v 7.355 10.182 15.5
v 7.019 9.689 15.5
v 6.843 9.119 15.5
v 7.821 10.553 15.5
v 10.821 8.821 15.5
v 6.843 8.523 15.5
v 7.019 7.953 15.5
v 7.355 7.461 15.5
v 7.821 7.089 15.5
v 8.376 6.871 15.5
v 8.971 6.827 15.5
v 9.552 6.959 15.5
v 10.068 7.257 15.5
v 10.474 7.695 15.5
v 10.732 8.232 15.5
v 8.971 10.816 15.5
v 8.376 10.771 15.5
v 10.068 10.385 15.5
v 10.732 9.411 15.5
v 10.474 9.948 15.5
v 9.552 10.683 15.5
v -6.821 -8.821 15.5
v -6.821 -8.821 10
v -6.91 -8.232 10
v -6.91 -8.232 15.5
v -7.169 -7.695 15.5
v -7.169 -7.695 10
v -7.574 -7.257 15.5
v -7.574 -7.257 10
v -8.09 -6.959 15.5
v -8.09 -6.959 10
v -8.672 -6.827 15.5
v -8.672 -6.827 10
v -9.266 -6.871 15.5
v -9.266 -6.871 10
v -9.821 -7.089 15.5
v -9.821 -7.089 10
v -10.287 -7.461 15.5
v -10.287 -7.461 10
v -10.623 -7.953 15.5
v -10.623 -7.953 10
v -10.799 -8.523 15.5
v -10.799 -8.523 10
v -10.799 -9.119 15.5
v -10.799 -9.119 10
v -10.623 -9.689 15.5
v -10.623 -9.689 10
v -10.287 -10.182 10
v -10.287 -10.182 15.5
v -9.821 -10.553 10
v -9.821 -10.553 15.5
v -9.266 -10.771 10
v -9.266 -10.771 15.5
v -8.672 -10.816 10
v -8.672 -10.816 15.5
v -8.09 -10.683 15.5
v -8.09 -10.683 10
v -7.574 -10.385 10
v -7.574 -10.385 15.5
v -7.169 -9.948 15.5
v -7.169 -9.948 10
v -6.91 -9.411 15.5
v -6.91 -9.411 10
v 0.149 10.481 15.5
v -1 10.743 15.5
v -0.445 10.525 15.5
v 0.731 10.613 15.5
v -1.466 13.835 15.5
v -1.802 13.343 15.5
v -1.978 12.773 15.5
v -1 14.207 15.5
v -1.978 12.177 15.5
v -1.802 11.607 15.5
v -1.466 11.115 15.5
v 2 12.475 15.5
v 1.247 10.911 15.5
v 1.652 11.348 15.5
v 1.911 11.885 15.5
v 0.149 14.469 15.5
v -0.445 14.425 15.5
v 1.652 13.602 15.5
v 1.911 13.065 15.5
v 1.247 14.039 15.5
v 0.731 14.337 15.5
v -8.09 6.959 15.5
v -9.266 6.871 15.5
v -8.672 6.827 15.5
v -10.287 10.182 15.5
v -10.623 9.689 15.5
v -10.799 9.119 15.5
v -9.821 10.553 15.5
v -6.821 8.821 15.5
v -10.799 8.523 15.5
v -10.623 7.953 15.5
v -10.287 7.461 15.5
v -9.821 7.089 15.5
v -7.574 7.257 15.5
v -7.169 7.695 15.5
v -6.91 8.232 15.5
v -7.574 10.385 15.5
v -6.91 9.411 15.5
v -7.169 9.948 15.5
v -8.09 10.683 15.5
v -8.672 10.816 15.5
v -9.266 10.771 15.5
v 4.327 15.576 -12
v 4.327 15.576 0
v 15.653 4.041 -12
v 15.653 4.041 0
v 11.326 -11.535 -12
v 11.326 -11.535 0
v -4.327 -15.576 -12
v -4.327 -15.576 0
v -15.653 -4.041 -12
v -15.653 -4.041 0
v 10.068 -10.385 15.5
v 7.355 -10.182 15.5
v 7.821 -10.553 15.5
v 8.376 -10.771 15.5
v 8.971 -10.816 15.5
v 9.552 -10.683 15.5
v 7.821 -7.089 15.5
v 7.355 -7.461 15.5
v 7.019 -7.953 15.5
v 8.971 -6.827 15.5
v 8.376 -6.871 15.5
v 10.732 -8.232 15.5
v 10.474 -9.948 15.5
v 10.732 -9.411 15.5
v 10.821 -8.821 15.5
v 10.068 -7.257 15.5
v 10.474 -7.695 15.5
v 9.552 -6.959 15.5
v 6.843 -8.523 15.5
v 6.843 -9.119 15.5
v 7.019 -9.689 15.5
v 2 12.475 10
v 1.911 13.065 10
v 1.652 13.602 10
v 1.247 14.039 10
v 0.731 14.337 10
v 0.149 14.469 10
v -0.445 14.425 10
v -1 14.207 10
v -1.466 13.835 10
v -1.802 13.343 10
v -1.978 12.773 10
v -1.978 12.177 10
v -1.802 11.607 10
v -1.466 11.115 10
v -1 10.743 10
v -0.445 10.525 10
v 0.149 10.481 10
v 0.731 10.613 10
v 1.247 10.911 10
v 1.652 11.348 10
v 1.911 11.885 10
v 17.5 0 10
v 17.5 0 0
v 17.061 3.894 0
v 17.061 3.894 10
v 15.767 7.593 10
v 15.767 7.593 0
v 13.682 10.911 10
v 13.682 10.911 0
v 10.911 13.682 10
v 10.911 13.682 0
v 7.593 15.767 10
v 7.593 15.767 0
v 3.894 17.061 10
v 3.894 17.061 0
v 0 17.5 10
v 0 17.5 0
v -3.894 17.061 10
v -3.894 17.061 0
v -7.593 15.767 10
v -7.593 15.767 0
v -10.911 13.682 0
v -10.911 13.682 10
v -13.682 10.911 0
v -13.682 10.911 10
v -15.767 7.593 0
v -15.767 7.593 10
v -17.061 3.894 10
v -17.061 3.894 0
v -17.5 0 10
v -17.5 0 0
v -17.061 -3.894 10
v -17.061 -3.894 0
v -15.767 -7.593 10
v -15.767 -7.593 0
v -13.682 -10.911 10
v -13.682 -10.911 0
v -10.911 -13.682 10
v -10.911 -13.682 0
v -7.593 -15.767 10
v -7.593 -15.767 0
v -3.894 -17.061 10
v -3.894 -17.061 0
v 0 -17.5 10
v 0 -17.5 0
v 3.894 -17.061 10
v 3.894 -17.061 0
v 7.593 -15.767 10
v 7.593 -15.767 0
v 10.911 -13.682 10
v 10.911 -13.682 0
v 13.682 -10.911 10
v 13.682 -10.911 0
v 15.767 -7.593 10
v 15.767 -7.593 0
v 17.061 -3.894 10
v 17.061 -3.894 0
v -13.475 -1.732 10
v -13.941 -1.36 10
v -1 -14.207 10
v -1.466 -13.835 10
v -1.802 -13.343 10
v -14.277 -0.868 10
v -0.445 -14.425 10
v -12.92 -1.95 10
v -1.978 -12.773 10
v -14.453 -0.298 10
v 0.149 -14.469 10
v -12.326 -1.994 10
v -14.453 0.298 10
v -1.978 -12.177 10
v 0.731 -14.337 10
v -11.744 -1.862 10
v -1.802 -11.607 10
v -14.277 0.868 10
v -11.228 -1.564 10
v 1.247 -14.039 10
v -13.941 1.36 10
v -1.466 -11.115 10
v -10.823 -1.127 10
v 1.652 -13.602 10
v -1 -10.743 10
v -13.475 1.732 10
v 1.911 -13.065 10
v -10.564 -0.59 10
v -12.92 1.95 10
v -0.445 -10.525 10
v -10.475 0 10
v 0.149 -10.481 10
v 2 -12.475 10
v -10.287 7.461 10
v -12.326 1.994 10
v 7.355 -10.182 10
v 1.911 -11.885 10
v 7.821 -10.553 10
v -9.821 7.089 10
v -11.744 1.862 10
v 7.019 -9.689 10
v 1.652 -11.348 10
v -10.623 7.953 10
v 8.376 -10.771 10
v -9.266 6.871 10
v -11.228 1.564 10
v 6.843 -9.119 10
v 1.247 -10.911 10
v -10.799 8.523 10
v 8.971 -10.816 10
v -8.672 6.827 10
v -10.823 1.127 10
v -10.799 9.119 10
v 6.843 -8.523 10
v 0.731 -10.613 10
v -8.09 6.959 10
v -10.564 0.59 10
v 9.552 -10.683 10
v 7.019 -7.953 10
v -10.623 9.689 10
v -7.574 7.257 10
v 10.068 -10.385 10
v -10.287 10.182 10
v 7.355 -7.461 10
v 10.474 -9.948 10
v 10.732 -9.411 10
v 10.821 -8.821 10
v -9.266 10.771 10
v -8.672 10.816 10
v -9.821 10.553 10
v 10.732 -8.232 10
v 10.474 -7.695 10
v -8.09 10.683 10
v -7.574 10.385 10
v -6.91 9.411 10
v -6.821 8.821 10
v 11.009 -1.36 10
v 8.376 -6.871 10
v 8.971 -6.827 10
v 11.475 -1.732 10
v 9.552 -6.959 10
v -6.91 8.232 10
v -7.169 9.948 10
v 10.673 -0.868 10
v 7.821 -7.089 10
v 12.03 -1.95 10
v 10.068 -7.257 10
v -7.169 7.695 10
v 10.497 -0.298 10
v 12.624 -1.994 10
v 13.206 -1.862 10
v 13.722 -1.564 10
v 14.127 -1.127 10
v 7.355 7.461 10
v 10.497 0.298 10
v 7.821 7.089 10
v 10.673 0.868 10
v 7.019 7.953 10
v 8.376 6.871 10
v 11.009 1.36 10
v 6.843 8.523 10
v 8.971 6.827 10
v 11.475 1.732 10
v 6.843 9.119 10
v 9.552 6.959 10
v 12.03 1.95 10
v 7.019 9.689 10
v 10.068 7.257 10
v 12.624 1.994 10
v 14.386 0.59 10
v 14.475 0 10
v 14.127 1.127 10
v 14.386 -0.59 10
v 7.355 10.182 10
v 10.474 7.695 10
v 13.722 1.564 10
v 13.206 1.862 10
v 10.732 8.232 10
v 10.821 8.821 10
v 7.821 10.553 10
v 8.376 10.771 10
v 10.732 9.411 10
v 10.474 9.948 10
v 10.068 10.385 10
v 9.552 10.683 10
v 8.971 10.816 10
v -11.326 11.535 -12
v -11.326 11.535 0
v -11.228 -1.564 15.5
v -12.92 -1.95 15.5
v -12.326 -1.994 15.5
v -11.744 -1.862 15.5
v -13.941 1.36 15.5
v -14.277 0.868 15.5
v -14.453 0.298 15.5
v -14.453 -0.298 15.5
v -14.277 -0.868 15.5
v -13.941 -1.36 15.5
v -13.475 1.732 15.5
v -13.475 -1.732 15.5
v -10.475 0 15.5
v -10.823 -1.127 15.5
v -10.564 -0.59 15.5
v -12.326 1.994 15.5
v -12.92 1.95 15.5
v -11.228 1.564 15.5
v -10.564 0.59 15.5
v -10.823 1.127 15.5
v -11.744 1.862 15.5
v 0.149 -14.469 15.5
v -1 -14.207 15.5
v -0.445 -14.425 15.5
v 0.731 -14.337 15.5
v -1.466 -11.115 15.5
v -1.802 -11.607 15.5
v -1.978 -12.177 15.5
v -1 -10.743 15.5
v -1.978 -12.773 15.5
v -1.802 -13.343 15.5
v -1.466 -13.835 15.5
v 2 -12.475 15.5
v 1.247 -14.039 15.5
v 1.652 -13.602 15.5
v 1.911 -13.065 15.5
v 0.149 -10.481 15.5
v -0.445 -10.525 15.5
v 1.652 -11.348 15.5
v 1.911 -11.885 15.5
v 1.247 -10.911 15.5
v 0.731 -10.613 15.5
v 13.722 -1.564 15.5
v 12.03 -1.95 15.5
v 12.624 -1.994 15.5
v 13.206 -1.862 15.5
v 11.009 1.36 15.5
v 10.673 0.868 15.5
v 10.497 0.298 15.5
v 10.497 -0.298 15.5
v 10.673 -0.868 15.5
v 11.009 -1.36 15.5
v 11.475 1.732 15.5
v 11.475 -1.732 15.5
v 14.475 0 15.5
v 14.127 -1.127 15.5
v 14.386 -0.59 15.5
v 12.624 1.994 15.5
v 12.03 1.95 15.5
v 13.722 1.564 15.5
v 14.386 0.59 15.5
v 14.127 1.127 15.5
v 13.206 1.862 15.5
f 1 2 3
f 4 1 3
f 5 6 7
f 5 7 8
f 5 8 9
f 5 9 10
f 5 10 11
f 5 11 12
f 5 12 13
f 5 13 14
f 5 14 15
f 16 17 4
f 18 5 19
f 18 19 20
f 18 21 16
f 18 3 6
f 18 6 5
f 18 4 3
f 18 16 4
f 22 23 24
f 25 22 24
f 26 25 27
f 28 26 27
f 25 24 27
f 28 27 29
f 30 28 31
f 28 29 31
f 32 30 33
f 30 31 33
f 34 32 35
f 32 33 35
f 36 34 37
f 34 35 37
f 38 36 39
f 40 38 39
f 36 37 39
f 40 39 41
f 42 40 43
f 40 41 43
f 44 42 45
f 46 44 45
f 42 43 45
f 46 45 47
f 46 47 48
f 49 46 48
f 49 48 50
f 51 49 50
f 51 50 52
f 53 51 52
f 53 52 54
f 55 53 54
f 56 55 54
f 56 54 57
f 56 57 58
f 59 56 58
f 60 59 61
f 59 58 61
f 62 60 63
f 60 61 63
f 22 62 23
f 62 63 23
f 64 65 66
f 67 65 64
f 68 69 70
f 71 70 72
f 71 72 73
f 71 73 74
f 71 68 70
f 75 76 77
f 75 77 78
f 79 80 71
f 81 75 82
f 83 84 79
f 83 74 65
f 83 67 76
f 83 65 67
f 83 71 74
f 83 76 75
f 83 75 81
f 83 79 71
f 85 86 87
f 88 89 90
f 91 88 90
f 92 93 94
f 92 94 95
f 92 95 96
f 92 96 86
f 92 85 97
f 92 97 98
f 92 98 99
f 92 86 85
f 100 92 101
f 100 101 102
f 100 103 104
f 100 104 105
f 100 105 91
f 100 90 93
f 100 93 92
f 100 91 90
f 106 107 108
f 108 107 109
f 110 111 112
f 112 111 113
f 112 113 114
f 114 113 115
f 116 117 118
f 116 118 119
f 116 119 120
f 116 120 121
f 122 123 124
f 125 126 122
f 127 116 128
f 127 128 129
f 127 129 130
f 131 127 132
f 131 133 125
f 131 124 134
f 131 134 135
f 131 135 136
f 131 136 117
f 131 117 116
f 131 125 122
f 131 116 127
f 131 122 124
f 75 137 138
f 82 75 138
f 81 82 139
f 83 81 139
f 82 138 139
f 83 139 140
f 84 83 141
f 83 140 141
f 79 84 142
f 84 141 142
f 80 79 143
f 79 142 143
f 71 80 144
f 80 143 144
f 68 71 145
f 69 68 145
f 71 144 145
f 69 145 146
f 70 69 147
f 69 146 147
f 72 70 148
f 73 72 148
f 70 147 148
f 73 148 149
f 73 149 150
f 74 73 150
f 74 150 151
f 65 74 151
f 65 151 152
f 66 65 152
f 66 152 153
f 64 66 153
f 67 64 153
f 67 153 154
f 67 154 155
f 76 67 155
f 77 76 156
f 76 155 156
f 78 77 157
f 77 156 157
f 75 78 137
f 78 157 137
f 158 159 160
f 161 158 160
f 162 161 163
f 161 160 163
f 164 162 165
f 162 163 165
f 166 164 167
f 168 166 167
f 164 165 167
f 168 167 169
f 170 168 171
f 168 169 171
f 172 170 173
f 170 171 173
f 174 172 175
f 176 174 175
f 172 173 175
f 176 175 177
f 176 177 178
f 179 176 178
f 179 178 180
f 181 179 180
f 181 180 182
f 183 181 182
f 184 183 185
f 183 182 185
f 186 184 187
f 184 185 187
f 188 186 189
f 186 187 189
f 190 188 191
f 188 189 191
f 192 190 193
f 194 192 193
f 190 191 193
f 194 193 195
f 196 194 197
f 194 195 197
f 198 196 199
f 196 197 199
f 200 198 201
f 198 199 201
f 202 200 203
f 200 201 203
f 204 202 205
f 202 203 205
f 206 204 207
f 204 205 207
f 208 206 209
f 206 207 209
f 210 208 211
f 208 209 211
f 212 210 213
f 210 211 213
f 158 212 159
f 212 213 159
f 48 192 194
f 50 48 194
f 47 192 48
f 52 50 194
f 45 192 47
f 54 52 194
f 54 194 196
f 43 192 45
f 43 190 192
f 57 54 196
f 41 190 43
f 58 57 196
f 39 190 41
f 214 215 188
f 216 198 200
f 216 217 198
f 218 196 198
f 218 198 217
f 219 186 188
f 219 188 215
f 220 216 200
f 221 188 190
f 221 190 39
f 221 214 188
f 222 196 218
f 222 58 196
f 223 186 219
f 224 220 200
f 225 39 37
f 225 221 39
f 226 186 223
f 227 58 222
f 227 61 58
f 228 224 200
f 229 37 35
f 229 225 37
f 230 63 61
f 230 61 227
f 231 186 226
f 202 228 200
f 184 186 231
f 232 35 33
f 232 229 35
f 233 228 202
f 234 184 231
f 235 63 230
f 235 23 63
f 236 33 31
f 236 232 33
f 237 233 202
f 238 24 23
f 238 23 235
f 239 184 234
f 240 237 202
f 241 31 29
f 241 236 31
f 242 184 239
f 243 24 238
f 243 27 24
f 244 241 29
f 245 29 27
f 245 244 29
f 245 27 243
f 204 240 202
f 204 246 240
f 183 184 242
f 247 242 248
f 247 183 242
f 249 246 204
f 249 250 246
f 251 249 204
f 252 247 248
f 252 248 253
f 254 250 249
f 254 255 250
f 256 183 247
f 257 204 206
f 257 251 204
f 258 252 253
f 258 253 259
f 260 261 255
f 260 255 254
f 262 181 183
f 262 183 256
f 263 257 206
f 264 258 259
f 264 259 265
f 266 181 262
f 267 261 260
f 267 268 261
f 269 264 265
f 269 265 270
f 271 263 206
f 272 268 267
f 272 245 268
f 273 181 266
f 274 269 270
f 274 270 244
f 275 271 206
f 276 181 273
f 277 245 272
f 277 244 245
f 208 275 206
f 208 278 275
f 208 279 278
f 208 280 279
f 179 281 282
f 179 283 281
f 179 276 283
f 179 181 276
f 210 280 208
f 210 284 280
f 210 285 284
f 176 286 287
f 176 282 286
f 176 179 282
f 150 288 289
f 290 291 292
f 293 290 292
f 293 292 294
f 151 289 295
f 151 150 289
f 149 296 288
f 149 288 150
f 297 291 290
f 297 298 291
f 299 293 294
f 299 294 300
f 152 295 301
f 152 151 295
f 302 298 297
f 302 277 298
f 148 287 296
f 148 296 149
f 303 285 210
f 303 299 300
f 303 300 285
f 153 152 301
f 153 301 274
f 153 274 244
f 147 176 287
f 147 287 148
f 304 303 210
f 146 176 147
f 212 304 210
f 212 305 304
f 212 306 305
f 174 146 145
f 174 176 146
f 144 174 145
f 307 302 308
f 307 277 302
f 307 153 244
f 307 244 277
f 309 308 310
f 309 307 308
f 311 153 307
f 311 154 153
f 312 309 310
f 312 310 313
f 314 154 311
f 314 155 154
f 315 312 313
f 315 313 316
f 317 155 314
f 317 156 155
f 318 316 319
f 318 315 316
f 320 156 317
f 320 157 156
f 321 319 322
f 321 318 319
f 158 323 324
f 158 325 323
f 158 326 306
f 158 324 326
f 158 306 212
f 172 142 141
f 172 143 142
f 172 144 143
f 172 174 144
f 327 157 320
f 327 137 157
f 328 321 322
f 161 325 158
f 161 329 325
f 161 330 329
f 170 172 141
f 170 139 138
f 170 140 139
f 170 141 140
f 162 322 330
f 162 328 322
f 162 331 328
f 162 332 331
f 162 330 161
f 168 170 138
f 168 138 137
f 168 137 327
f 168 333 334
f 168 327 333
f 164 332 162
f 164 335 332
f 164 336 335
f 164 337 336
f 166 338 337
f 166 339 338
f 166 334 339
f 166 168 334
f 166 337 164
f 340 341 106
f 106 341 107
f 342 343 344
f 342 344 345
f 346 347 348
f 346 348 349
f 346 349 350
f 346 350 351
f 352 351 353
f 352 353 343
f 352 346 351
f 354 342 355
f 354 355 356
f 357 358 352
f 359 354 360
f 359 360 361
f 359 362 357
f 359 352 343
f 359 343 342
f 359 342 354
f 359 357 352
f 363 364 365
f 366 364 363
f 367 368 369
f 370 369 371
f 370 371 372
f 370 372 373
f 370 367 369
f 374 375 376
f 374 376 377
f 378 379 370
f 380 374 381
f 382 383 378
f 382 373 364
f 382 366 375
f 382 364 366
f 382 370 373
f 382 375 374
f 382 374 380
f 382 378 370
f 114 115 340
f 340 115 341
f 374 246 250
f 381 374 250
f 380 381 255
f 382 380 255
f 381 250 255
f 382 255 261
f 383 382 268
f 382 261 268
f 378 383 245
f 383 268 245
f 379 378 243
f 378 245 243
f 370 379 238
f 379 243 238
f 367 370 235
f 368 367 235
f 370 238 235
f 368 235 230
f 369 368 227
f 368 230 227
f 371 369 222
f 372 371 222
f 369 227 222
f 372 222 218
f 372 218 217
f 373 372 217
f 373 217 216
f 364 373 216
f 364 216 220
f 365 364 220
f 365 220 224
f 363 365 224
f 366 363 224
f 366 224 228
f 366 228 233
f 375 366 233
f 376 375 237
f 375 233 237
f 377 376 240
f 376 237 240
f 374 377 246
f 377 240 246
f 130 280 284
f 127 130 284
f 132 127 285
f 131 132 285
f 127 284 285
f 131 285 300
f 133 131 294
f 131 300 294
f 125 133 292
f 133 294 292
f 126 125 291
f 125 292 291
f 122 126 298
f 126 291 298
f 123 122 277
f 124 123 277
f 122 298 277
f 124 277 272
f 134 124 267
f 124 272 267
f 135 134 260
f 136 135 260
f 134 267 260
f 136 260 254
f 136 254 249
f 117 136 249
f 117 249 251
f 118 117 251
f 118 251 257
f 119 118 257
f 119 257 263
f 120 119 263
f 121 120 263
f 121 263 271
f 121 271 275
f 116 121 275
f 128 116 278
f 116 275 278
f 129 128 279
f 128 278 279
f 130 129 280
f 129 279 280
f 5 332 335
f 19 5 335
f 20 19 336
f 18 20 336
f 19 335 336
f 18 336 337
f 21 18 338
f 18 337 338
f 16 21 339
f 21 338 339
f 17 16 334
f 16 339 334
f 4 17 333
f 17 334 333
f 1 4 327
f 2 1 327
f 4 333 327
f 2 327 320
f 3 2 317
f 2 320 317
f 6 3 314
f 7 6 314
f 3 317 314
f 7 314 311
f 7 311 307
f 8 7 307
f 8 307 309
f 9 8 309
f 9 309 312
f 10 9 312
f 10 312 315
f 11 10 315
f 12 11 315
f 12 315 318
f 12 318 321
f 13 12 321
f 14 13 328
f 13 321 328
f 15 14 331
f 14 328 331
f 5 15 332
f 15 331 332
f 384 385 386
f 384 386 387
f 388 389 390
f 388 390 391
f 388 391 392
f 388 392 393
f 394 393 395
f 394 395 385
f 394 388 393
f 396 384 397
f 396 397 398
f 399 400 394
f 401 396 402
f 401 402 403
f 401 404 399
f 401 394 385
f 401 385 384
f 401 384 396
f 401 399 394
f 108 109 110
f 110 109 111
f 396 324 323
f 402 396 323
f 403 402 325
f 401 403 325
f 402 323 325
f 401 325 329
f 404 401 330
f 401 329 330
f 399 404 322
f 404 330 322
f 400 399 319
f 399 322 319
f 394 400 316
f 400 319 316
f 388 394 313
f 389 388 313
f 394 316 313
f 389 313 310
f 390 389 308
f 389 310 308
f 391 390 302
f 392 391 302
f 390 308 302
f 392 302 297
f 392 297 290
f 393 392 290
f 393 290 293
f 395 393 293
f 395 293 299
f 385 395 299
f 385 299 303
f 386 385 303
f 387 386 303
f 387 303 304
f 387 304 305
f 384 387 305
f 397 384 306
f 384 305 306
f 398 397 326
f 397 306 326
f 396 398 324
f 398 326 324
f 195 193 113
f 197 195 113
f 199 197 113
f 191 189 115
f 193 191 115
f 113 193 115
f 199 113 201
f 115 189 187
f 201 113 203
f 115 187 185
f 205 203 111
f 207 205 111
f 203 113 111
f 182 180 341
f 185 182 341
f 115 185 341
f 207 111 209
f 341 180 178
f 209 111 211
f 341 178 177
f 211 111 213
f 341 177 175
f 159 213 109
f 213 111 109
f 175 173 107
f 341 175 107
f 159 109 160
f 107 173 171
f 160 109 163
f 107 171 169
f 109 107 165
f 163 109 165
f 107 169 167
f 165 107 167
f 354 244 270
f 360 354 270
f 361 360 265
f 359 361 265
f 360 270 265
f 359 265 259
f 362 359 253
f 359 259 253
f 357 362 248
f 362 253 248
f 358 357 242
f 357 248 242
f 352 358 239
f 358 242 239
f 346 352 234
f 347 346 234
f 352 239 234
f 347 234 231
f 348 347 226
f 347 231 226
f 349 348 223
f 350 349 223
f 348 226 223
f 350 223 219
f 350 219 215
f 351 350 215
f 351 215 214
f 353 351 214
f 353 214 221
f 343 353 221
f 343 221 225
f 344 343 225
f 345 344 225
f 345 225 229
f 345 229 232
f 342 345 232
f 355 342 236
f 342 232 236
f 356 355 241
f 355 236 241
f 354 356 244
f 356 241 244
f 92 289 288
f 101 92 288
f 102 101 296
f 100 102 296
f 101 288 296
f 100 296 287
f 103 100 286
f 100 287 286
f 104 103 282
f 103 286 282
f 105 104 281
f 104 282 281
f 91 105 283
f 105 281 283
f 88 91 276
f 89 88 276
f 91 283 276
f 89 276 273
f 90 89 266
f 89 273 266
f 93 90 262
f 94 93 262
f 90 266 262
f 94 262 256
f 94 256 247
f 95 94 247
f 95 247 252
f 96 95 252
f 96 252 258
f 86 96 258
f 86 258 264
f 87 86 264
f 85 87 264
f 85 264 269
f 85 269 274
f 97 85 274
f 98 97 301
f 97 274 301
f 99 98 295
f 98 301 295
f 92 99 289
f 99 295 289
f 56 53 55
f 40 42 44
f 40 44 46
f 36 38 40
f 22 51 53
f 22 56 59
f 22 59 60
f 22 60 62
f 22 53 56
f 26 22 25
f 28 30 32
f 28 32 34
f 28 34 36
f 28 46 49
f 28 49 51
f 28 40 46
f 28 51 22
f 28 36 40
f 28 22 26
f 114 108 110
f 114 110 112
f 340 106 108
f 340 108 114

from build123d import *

# Parameters (mm, degrees)
ESQUISSE1_R        = 17.5
BOSS_EXTRU_1_DEPTH = 10
ESQUISSE2_R        = 2
BOSS_EXTRU_2_DEPTH = 5.5
BOSS_EXTRU_3_DEPTH = 12


with BuildPart() as part:
    # Esquisse1 → Boss.-Extru.1 (new body)
    with BuildSketch(Plane.XY):
        Circle(ESQUISSE1_R)
    extrude(amount=BOSS_EXTRU_1_DEPTH)

    # Esquisse2 → Boss.-Extru.2 (add)
    with BuildSketch(Plane.XY.offset(10)):
        with Locations((8.821157095, 8.821157095)):
            Circle(ESQUISSE2_R)
        with Locations((0, 12.475)):
            Circle(ESQUISSE2_R)
        with Locations((12.475, 0)):
            Circle(ESQUISSE2_R)
        with Locations((8.821157095, -8.821157095)):
            Circle(ESQUISSE2_R)
        with Locations((0, -12.475)):
            Circle(ESQUISSE2_R)
        with Locations((-8.821157095, -8.821157095)):
            Circle(ESQUISSE2_R)
        with Locations((-12.475, 0)):
            Circle(ESQUISSE2_R)
        with Locations((-8.821157095, 8.821157095)):
            Circle(ESQUISSE2_R)
    extrude(amount=BOSS_EXTRU_2_DEPTH)

    # Esquisse3 → Boss.-Extru.3 (add)
    with BuildSketch(Plane(origin=(0, 0, 0), x_dir=(-1, 0, 0), z_dir=(0, 0, -1))):
        Polygon((11.325586205, 11.535355671), (-4.32711795, 15.575923202), (-15.652704155, 4.040567531), (-11.325586205, -11.535355671), (4.32711795, -15.575923202), (15.652704155, -4.040567531), align=None)
    extrude(amount=BOSS_EXTRU_3_DEPTH)


solid = part.part
